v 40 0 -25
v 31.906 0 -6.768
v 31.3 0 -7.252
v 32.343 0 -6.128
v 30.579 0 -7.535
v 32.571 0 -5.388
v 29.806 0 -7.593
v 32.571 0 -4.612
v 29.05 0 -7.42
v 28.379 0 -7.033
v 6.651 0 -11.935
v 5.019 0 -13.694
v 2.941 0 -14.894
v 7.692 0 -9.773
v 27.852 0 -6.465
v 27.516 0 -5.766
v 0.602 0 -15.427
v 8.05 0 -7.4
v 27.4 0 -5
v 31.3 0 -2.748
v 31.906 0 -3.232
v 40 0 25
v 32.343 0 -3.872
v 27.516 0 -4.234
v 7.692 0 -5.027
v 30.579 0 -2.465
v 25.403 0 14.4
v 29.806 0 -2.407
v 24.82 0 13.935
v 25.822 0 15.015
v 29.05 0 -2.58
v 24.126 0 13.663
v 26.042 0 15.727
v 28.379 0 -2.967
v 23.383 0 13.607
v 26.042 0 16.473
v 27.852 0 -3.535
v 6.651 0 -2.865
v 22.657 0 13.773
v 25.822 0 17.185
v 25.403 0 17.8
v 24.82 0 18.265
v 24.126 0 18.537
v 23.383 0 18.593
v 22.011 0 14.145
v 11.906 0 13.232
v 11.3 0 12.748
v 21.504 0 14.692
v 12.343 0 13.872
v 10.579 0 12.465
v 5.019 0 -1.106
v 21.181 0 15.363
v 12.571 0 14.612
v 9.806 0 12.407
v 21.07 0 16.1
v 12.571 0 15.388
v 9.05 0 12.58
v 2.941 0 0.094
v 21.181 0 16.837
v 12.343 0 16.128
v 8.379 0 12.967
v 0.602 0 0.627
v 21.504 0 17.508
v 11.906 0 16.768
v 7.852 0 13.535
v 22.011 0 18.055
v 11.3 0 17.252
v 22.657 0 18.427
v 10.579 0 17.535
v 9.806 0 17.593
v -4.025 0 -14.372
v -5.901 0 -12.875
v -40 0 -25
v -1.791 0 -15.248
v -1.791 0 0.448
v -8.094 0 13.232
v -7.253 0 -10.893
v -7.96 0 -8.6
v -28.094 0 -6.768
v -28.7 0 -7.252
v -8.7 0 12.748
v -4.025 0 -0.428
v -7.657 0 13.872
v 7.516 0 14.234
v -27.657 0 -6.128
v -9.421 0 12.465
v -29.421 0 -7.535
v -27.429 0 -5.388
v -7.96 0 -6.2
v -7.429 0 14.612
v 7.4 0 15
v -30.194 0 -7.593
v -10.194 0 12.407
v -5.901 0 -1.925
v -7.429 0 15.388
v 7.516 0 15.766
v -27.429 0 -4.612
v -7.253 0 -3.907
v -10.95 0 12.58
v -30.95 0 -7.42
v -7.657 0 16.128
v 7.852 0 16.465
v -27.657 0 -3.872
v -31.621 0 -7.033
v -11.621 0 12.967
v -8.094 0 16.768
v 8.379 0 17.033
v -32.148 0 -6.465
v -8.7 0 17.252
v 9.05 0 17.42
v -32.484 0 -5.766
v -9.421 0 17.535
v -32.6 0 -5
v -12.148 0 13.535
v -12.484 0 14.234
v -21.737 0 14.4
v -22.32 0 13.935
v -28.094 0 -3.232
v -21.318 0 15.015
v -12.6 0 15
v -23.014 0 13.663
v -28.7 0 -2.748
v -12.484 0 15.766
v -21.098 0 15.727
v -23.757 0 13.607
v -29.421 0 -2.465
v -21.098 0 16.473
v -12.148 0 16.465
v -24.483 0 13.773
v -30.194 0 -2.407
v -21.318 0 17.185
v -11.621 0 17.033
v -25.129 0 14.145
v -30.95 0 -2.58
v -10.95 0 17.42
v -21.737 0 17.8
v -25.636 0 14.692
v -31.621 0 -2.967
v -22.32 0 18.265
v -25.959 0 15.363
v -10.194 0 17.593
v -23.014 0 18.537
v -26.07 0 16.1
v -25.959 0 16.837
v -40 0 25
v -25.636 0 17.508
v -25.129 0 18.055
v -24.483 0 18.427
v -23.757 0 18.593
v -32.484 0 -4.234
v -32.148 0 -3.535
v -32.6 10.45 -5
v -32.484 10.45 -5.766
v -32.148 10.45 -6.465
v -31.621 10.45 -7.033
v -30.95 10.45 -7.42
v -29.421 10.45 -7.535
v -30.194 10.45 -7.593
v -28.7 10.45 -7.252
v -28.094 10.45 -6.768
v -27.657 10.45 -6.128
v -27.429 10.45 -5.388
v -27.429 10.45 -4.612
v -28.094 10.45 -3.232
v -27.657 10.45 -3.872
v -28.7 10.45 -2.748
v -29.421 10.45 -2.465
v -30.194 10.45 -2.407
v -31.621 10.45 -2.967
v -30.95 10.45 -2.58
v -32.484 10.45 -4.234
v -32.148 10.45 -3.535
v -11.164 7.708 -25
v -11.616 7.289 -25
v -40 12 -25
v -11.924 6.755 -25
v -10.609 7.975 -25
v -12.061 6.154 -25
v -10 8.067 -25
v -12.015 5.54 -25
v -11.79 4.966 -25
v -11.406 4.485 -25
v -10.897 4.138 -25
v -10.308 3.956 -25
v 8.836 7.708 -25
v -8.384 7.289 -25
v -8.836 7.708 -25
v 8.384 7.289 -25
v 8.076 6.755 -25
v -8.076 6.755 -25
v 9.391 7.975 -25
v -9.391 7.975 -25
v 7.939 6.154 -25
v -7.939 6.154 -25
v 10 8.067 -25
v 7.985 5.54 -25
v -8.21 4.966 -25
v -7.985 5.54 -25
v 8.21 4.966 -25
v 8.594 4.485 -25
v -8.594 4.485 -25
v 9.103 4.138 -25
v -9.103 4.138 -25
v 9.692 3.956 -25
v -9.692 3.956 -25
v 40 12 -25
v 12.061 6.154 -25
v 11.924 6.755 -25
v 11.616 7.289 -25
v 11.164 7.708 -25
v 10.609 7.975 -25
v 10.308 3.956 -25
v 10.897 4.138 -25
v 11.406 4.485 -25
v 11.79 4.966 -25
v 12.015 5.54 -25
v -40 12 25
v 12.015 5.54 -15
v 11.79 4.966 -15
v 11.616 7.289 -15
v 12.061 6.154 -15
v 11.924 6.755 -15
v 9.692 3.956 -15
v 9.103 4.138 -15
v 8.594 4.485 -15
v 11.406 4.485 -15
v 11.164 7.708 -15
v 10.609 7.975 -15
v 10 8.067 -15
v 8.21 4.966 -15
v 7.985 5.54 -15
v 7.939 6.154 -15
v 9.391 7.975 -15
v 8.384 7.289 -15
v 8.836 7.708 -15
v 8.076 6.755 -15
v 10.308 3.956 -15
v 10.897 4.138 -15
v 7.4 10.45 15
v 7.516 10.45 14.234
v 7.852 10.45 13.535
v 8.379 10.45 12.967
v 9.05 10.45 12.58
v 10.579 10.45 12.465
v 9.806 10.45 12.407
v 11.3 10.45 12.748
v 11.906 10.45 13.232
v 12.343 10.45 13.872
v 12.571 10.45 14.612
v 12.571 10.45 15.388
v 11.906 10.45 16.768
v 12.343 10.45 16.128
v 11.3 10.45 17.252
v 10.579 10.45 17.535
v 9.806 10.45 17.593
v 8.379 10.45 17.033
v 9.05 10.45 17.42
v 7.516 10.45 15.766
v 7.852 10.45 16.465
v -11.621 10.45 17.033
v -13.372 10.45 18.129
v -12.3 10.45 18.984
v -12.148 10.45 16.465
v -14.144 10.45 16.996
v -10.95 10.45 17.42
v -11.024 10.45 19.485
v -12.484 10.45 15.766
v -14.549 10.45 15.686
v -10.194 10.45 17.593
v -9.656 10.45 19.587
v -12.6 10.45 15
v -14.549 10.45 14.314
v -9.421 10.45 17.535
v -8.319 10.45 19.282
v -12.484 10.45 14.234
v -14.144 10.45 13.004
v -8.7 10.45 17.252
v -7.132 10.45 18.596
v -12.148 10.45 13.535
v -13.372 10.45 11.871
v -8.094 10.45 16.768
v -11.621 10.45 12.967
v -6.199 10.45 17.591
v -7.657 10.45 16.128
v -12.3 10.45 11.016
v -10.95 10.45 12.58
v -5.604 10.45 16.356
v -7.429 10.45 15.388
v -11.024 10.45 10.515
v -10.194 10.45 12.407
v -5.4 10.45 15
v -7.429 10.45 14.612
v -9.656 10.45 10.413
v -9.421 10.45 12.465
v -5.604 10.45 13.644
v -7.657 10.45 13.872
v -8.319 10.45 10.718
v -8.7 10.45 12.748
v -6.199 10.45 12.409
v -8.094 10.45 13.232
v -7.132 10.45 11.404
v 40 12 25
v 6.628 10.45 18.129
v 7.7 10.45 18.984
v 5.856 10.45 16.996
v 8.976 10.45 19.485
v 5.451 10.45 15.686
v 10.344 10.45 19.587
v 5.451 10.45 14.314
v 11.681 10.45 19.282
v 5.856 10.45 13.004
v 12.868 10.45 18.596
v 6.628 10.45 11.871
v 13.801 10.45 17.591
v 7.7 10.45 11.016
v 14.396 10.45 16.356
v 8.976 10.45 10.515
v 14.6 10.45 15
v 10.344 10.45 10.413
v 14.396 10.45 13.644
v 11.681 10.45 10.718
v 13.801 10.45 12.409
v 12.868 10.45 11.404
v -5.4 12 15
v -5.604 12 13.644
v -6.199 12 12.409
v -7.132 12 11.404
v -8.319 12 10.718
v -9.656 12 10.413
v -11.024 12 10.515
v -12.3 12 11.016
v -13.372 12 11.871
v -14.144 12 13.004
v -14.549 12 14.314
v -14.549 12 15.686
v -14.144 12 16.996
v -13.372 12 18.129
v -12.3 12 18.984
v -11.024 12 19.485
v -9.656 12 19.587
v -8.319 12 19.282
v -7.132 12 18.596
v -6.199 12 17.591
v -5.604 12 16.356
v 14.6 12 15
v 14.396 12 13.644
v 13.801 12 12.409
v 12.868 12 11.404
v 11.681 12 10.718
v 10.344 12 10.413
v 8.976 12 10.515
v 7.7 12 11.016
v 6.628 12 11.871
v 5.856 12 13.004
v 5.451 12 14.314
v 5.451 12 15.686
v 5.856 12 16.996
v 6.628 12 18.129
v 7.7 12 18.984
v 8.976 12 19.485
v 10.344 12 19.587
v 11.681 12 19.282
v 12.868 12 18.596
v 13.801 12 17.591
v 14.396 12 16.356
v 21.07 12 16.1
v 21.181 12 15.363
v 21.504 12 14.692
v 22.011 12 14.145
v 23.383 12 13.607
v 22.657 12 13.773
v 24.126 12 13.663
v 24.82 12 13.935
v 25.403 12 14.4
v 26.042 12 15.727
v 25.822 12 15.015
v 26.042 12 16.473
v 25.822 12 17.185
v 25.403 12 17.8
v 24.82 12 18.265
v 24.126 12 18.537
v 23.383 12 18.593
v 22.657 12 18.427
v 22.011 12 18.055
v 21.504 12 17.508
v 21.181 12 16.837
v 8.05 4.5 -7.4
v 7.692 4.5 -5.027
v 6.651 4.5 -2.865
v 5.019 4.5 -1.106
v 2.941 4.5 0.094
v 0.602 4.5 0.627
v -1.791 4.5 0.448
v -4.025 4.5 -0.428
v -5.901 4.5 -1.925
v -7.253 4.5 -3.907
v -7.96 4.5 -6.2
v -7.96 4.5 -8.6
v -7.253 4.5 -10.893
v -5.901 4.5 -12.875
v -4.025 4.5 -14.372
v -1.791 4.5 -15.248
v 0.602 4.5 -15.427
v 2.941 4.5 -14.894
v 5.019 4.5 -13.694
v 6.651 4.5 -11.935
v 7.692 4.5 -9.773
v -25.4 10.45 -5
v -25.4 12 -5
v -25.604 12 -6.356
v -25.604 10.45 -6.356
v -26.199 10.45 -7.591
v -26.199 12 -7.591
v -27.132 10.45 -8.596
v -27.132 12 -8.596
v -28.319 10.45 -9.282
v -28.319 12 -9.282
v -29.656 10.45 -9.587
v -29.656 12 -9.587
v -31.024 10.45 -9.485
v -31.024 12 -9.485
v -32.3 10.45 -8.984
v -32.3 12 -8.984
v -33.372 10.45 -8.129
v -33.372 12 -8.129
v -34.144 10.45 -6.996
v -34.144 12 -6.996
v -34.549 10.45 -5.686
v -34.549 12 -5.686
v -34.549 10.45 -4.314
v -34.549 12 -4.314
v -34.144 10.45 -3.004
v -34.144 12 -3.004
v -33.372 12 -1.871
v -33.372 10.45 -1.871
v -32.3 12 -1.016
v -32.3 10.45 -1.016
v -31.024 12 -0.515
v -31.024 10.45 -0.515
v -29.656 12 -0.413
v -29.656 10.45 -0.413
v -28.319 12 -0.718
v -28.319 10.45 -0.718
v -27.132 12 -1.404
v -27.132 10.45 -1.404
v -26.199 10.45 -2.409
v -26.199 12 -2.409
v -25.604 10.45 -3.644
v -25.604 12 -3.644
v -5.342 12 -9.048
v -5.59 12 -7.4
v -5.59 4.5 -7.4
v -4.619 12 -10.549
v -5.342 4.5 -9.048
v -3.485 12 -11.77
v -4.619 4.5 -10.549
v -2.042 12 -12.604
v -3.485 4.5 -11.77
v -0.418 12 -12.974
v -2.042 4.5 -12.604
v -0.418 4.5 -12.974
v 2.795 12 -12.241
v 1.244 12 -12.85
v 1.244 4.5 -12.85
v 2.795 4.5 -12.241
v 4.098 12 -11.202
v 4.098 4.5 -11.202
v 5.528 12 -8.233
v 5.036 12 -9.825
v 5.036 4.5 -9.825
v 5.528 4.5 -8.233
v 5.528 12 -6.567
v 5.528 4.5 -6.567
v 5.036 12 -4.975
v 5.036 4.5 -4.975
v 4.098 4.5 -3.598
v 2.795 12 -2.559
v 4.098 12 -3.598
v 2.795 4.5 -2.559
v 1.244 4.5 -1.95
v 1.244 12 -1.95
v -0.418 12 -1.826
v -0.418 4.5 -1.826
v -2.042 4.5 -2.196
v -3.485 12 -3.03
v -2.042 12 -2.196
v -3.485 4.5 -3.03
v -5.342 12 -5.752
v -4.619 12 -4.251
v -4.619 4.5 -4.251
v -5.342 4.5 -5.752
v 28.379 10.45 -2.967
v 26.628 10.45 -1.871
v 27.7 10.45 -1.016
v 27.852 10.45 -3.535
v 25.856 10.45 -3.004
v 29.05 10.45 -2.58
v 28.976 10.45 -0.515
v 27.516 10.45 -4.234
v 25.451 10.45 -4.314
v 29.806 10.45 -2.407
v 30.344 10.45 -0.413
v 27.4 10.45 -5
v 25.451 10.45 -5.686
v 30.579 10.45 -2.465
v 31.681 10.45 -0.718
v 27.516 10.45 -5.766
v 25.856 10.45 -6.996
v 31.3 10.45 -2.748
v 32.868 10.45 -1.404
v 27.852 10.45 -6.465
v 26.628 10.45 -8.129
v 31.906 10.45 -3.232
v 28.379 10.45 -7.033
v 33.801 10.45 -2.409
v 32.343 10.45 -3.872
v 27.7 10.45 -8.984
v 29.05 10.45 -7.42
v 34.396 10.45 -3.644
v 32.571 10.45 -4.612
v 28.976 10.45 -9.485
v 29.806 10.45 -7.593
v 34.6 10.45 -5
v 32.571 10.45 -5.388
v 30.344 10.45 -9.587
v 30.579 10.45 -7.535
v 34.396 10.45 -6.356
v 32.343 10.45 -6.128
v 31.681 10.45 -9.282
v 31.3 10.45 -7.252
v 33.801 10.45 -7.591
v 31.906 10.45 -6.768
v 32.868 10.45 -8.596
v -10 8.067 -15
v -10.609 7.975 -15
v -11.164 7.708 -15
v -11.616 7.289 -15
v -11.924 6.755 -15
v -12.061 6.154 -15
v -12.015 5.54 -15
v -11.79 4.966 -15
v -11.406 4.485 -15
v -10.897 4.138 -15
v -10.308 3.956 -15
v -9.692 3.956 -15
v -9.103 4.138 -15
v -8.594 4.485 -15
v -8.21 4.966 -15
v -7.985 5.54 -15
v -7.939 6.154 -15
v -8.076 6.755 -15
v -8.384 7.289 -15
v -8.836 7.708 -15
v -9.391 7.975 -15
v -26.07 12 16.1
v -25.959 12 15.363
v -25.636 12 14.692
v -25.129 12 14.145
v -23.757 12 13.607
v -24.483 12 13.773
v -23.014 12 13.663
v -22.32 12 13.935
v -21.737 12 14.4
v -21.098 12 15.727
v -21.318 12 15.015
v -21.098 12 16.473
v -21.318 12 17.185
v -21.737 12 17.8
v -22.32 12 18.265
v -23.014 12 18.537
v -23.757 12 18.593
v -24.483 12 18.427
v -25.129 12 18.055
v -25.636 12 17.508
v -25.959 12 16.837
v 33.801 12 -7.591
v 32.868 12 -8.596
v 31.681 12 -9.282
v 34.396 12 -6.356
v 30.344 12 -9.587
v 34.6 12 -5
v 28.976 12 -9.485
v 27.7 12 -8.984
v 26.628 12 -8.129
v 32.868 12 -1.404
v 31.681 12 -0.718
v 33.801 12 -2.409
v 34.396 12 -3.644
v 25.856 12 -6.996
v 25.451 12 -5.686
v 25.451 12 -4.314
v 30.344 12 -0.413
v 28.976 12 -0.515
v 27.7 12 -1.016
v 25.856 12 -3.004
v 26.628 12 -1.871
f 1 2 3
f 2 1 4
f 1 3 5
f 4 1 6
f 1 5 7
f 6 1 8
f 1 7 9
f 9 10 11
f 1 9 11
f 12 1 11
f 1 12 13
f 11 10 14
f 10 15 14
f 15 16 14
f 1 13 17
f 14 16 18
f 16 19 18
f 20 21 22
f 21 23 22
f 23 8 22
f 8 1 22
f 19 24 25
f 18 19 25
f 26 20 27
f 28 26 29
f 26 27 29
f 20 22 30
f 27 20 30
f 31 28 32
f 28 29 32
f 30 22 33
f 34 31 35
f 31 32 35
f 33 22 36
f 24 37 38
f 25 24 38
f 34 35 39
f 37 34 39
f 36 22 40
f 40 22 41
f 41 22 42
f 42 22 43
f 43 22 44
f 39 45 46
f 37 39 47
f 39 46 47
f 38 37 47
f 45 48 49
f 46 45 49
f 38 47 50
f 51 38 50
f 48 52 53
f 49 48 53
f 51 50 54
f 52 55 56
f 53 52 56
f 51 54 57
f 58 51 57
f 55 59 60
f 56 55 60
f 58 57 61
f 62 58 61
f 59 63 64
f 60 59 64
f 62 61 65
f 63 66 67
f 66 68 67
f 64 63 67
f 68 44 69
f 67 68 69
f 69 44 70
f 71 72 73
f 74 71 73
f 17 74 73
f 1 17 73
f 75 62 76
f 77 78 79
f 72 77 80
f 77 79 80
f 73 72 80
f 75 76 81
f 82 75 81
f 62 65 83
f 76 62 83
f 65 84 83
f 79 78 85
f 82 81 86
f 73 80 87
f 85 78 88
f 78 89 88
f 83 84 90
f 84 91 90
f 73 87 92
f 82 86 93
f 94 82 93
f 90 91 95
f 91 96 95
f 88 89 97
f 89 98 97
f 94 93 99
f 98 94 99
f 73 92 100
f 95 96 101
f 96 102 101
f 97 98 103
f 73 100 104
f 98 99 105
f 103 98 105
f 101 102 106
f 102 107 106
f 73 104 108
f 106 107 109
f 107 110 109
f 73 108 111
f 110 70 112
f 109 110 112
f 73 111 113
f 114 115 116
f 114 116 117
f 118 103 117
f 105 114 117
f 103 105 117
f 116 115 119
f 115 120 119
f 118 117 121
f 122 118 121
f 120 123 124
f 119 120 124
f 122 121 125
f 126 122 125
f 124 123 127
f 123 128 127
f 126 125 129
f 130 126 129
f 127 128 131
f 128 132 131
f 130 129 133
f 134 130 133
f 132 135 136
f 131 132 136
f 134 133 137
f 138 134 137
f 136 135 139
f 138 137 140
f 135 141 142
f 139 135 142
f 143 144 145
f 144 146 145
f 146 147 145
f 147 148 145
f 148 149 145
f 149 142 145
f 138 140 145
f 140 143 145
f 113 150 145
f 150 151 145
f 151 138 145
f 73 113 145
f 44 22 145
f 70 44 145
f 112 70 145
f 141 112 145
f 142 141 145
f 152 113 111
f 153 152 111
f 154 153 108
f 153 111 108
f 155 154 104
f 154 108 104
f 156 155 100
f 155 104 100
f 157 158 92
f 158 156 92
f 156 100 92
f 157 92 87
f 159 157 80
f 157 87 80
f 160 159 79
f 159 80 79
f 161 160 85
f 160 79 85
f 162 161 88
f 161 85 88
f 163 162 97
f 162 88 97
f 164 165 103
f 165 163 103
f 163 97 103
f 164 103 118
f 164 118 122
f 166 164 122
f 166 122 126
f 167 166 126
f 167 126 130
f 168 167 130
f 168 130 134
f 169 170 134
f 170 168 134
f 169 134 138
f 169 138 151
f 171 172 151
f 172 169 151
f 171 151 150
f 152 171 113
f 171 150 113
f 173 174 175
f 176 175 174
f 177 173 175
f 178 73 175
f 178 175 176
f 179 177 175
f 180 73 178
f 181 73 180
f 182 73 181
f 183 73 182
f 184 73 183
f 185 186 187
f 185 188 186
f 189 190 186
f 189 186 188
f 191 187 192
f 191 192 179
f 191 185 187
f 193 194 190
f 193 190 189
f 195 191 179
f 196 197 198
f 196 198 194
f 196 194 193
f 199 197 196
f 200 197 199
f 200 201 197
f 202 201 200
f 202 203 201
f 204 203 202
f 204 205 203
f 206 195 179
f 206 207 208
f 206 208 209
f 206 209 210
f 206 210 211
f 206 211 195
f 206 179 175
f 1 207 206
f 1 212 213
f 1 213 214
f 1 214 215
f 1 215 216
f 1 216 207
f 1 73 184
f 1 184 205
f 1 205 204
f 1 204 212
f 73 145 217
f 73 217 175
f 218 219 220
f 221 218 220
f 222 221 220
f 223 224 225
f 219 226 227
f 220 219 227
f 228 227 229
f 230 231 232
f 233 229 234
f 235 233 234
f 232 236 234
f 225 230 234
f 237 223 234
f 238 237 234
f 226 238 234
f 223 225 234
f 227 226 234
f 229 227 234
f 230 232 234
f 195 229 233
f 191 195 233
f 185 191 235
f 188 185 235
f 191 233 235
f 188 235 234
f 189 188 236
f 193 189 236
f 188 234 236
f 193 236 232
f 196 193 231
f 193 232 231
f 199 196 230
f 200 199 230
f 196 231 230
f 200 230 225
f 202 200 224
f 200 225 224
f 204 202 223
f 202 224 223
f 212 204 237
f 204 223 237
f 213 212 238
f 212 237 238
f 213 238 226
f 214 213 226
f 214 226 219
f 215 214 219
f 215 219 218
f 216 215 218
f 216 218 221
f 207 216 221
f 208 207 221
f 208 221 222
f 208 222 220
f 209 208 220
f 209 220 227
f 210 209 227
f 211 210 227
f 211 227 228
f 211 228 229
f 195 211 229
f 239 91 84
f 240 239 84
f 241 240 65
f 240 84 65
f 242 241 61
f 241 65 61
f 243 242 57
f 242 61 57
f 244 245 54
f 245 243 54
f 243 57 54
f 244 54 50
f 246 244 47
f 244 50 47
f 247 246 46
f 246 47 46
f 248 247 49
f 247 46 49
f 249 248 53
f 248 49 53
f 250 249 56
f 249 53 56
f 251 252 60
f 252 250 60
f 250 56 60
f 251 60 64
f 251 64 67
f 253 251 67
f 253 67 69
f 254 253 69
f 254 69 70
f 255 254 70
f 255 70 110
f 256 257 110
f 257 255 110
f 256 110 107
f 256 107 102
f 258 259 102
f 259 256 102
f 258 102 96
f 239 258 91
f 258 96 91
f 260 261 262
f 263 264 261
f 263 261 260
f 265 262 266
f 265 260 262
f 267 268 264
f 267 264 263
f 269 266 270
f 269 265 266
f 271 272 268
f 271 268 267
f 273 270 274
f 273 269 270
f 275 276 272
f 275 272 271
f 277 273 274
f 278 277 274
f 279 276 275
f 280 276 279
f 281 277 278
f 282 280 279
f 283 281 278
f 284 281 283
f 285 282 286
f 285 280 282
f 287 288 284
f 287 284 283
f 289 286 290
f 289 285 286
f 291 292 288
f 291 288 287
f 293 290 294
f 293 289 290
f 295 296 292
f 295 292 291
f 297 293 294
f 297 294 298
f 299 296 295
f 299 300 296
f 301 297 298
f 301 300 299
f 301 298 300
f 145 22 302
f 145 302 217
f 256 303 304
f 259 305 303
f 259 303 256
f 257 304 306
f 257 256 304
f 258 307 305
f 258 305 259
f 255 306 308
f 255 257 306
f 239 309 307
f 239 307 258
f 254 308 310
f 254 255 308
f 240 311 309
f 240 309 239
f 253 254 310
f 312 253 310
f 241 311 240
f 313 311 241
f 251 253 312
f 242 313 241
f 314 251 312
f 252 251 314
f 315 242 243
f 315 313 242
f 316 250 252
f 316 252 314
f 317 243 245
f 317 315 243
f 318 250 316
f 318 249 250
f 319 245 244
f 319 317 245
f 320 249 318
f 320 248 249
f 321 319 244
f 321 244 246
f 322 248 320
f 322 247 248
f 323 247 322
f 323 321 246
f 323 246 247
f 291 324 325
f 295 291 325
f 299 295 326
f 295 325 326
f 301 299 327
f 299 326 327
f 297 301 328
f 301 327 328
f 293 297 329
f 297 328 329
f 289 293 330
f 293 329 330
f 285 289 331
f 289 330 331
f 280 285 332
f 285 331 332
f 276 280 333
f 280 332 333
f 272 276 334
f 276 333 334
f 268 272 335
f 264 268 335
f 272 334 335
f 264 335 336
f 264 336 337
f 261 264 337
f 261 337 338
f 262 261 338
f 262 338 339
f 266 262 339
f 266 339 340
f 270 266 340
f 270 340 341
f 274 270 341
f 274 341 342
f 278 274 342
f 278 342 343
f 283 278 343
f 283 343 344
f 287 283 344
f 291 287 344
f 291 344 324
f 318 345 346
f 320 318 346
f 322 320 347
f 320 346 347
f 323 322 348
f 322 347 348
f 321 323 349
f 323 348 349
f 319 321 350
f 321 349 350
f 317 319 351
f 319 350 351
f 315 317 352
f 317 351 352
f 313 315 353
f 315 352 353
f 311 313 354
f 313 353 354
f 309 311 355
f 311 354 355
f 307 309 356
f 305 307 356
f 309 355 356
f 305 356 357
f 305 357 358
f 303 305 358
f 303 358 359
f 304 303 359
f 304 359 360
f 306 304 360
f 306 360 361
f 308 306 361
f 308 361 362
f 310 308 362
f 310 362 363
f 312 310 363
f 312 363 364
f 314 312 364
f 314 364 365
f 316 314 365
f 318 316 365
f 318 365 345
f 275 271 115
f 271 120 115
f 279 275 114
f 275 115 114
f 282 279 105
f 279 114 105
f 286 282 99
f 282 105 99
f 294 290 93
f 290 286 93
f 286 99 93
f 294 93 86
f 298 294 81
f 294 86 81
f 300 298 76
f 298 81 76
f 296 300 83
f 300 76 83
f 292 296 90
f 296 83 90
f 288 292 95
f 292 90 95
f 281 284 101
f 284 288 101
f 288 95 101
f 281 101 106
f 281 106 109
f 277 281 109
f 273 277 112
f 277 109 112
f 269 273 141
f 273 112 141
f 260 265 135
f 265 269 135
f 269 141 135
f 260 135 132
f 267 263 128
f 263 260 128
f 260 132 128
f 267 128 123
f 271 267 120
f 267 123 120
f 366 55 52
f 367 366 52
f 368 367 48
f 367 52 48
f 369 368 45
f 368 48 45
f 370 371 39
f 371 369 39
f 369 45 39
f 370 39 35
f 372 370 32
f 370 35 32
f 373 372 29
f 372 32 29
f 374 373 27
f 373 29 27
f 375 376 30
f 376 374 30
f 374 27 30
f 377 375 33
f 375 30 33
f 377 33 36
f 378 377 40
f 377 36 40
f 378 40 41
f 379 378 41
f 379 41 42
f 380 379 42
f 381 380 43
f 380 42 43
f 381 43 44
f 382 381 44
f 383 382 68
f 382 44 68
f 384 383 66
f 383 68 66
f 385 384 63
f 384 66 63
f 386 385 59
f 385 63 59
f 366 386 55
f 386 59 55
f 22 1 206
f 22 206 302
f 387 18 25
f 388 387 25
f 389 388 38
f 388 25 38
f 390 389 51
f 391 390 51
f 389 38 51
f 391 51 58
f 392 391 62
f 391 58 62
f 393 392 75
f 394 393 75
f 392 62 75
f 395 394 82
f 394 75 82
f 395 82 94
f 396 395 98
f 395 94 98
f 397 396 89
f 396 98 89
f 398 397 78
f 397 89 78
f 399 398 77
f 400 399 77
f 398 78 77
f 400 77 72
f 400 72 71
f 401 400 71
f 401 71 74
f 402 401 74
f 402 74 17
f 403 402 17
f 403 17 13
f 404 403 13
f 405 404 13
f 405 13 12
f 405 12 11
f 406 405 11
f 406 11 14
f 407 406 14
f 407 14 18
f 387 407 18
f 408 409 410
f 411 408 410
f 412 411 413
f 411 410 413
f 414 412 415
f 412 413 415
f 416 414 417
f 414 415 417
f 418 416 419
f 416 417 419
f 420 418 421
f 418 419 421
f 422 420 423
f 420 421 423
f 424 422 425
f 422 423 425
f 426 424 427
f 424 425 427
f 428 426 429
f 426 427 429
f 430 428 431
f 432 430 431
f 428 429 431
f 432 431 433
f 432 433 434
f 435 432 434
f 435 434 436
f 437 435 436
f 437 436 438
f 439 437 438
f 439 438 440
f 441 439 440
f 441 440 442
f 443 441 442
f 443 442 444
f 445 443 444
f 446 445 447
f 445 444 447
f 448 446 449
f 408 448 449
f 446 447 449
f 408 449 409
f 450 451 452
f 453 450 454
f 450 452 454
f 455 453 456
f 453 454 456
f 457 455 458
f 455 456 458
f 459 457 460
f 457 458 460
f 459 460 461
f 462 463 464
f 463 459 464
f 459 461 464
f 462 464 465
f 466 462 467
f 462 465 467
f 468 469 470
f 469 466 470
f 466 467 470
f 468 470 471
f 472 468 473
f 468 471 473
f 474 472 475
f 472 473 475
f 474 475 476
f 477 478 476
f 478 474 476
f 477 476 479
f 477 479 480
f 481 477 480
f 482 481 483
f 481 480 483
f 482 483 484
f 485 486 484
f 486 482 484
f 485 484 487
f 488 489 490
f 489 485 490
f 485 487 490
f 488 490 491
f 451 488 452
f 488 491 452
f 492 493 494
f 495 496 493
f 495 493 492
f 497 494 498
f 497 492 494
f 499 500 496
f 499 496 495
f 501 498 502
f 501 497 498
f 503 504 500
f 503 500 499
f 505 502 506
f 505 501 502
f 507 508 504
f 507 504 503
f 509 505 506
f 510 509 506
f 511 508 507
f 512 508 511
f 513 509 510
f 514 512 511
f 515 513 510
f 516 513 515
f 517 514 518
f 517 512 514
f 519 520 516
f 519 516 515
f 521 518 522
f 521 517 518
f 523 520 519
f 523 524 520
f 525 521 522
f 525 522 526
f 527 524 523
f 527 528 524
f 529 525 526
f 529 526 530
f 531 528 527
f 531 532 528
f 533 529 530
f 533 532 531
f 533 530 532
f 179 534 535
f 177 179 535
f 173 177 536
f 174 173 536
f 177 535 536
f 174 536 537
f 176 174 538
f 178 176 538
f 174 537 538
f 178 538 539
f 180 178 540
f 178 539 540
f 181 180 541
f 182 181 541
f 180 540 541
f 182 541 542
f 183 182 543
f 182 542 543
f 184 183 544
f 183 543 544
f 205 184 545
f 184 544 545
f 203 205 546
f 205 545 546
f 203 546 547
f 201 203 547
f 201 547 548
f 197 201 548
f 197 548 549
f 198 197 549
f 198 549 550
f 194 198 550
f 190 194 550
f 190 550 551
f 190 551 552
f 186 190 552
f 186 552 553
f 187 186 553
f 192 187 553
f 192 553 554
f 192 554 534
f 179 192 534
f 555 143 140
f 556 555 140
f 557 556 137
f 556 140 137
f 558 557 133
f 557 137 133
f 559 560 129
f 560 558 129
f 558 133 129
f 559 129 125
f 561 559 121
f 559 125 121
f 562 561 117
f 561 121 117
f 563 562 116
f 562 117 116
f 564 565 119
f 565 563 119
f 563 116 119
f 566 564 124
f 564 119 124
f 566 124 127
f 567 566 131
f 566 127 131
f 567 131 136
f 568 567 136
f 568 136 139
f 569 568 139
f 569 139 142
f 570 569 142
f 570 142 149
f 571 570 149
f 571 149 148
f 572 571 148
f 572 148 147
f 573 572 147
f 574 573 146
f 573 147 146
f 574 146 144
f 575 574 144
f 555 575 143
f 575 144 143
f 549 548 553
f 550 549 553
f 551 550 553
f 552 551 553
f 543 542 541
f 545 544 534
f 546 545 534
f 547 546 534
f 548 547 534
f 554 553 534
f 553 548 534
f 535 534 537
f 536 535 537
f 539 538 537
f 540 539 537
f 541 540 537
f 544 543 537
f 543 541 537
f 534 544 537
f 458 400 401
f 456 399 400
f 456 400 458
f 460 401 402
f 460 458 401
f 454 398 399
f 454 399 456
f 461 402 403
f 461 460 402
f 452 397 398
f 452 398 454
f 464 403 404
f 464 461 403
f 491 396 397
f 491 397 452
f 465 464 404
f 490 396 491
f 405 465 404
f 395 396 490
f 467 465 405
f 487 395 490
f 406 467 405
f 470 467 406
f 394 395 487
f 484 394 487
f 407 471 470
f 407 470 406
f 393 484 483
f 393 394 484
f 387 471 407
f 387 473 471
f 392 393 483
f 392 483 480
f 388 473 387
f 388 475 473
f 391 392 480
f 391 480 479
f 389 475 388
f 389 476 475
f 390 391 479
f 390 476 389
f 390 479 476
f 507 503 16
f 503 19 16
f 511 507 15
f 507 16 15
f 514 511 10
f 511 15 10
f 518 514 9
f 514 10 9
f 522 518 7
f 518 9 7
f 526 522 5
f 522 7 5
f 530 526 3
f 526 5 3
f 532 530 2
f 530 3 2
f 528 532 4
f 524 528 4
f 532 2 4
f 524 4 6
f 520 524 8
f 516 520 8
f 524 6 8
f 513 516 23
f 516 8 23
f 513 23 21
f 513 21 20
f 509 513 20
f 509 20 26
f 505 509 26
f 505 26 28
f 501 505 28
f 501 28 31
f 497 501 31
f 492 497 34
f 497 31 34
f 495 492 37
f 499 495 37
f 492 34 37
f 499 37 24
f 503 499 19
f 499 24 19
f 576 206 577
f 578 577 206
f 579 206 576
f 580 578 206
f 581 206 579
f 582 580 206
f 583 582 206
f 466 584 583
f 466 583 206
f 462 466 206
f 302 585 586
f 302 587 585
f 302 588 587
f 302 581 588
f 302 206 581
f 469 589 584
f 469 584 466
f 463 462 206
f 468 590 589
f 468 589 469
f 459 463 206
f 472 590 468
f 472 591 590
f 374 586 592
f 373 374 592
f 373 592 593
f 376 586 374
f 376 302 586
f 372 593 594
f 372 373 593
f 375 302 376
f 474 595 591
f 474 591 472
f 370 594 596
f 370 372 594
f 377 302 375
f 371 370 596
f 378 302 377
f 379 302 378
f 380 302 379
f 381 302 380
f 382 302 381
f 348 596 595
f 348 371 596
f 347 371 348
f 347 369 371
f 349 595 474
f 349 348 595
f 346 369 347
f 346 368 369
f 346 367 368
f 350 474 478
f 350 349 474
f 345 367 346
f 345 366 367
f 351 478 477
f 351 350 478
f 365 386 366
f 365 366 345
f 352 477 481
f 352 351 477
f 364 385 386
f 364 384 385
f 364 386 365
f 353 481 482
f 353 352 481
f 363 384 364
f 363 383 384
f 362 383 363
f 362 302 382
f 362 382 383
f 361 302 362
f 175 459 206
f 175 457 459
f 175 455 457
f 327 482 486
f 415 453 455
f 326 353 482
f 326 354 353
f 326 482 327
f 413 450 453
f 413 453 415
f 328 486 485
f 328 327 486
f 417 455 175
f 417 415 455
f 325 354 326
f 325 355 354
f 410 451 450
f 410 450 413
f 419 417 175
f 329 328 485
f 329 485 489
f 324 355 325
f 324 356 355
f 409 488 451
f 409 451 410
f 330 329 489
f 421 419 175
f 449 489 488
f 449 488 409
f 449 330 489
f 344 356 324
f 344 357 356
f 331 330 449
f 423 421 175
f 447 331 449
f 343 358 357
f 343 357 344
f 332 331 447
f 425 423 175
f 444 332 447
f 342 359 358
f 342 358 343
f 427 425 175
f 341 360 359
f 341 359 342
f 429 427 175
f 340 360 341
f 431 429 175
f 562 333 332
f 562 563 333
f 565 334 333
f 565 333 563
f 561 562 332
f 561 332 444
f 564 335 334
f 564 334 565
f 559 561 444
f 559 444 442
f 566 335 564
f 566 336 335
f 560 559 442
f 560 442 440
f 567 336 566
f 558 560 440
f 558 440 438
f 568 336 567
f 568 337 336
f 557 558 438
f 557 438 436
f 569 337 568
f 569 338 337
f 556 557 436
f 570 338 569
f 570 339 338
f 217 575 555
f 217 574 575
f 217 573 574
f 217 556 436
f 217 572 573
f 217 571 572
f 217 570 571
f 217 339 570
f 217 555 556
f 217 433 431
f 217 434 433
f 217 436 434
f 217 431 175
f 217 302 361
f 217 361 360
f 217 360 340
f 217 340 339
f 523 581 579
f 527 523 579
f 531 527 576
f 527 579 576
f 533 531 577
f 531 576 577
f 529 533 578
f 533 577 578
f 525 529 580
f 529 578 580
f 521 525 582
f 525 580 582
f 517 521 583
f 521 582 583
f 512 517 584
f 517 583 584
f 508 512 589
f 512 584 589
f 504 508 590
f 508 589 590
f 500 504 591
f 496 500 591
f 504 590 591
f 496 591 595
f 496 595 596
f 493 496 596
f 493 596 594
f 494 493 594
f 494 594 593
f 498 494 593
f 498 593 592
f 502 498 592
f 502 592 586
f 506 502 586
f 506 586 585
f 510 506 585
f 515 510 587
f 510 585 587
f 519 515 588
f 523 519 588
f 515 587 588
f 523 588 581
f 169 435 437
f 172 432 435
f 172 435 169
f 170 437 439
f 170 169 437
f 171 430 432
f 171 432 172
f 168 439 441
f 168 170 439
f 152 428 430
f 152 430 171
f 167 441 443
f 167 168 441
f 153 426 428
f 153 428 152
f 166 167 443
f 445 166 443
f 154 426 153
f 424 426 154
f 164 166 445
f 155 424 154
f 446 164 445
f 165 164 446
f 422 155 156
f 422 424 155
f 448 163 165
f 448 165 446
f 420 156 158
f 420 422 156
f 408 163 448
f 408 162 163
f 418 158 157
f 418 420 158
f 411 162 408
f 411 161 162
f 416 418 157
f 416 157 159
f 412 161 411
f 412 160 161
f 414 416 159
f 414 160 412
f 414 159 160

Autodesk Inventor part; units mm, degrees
ref_plane "YZ Plane" through (0, 0, 0) normal (1, 0, 0) x (0, 1, 0)
ref_plane "XZ Plane" through (0, 0, 0) normal (0, 1, 0) x (-1, 0, 0)
ref_plane "XY Plane" through (0, 0, 0) normal (0, 0, 1) x (1, 0, 0)
sketch "Sketch1" plane through (0, 0, 0) normal (0, 1, 0) x (-1, 0, 0)
  line L0 (40, -25) -> (-40, -25)
  line L1 (-40, -25) -> (-40, 25)
  line L2 (-40, 25) -> (40, 25)
  line L3 (40, 25) -> (40, -25)
  circle A0 centre (30, -5) radius 2.6
  circle A1 centre (0, -7.4) radius 5.59
  circle A2 centre (-30, -5) radius 2.6
  circle A3 centre (10, 15) radius 2.6
  circle A4 centre (-10, 15) radius 2.6
  circle A5 centre (23.57, 16.1) radius 2.5
  circle A6 centre (-23.57, 16.1) radius 2.5
  point P0 (40, 0)
  point P1 (0, 0)
  point P2 (0, -25)
  dimension "d3" = 80
  dimension "d4" = 50
  dimension "d5" = 5.2
  dimension "d6" = 5.2
  dimension "d7" = 5
  dimension "d8" = 11.18
  dimension "d9" = 10
  dimension "d10" = 10
  dimension "d11" = 30
  dimension "d12" = 30
  dimension "d13" = 10
  dimension "d14" = 30
  dimension "d15" = 30
  dimension "d16" = 10
  dimension "d17" = 40
  dimension "d18" = 32.4
  dimension "d19" = 8.9
  dimension "d20" = 8.9
  dimension "d21" = 16.43
  dimension "d44" = 16.43
extrude "Extrusion1" add sketch "Sketch1" along normal blind 12
sketch "Sketch2" plane through (0, 12, 0) normal (0, 1, 0) x (1, 0, 0)
  circle A0 centre (-30, 5) radius 2.6 projected
  circle A1 centre (-10, -15) radius 2.6 projected
  circle A2 centre (10, -15) radius 2.6 projected
  circle A3 centre (30, 5) radius 2.6 projected
  circle A4 centre (-30, 5) radius 4.6
  circle A5 centre (-10, -15) radius 4.6
  circle A6 centre (10, -15) radius 4.6
  circle A7 centre (30, 5) radius 4.6
  point P0 (0, 0)
  dimension "d25" = 9.2
extrude "Extrusion2" cut sketch "Sketch2" against normal blind 1.55 contours A3 | A4 | A5 | A6 | A7
thread "Thread1" size "M5x0.8" class "6H" standard "ANSI Metric M Profile" full length
thread "Thread2" size "M5x0.8" class "6H" standard "ANSI Metric M Profile" full length
sketch "Sketch3" plane through (0, 0, 0) normal (0, -1, 0) x (1, 0, 0)
  circle A0 centre (0, -7.4) radius 5.59 projected
  circle A1 centre (0, -7.4) radius 8.05
  point P0 (0, 0)
  dimension "d32" = 16.1
extrude "Extrusion3" cut sketch "Sketch3" against normal blind 4.5 contours A0 | A1
sketch "Sketch4" plane through (40, 0, -25) normal (0, 0, -1) x (-1, 0, 0)
  line L0 (0, 0) -> (0, 12) projected
  point P0 (40, 0)
  point P1 (30, 6)
  point P2 (50, 6)
  point P3 (0, 6)
  dimension "d35" = 30
  dimension "d36" = 20
hole "Hole1" at (10, 6, -25) at (-10, 6, -25) direction (0, 0, 1) diameter 4.134 depth 10 thread size "M5x0.8" class "6H" standard "ISO Metric profile"
properties part number "C-Beam End Mount" material "Aluminum 6061"
